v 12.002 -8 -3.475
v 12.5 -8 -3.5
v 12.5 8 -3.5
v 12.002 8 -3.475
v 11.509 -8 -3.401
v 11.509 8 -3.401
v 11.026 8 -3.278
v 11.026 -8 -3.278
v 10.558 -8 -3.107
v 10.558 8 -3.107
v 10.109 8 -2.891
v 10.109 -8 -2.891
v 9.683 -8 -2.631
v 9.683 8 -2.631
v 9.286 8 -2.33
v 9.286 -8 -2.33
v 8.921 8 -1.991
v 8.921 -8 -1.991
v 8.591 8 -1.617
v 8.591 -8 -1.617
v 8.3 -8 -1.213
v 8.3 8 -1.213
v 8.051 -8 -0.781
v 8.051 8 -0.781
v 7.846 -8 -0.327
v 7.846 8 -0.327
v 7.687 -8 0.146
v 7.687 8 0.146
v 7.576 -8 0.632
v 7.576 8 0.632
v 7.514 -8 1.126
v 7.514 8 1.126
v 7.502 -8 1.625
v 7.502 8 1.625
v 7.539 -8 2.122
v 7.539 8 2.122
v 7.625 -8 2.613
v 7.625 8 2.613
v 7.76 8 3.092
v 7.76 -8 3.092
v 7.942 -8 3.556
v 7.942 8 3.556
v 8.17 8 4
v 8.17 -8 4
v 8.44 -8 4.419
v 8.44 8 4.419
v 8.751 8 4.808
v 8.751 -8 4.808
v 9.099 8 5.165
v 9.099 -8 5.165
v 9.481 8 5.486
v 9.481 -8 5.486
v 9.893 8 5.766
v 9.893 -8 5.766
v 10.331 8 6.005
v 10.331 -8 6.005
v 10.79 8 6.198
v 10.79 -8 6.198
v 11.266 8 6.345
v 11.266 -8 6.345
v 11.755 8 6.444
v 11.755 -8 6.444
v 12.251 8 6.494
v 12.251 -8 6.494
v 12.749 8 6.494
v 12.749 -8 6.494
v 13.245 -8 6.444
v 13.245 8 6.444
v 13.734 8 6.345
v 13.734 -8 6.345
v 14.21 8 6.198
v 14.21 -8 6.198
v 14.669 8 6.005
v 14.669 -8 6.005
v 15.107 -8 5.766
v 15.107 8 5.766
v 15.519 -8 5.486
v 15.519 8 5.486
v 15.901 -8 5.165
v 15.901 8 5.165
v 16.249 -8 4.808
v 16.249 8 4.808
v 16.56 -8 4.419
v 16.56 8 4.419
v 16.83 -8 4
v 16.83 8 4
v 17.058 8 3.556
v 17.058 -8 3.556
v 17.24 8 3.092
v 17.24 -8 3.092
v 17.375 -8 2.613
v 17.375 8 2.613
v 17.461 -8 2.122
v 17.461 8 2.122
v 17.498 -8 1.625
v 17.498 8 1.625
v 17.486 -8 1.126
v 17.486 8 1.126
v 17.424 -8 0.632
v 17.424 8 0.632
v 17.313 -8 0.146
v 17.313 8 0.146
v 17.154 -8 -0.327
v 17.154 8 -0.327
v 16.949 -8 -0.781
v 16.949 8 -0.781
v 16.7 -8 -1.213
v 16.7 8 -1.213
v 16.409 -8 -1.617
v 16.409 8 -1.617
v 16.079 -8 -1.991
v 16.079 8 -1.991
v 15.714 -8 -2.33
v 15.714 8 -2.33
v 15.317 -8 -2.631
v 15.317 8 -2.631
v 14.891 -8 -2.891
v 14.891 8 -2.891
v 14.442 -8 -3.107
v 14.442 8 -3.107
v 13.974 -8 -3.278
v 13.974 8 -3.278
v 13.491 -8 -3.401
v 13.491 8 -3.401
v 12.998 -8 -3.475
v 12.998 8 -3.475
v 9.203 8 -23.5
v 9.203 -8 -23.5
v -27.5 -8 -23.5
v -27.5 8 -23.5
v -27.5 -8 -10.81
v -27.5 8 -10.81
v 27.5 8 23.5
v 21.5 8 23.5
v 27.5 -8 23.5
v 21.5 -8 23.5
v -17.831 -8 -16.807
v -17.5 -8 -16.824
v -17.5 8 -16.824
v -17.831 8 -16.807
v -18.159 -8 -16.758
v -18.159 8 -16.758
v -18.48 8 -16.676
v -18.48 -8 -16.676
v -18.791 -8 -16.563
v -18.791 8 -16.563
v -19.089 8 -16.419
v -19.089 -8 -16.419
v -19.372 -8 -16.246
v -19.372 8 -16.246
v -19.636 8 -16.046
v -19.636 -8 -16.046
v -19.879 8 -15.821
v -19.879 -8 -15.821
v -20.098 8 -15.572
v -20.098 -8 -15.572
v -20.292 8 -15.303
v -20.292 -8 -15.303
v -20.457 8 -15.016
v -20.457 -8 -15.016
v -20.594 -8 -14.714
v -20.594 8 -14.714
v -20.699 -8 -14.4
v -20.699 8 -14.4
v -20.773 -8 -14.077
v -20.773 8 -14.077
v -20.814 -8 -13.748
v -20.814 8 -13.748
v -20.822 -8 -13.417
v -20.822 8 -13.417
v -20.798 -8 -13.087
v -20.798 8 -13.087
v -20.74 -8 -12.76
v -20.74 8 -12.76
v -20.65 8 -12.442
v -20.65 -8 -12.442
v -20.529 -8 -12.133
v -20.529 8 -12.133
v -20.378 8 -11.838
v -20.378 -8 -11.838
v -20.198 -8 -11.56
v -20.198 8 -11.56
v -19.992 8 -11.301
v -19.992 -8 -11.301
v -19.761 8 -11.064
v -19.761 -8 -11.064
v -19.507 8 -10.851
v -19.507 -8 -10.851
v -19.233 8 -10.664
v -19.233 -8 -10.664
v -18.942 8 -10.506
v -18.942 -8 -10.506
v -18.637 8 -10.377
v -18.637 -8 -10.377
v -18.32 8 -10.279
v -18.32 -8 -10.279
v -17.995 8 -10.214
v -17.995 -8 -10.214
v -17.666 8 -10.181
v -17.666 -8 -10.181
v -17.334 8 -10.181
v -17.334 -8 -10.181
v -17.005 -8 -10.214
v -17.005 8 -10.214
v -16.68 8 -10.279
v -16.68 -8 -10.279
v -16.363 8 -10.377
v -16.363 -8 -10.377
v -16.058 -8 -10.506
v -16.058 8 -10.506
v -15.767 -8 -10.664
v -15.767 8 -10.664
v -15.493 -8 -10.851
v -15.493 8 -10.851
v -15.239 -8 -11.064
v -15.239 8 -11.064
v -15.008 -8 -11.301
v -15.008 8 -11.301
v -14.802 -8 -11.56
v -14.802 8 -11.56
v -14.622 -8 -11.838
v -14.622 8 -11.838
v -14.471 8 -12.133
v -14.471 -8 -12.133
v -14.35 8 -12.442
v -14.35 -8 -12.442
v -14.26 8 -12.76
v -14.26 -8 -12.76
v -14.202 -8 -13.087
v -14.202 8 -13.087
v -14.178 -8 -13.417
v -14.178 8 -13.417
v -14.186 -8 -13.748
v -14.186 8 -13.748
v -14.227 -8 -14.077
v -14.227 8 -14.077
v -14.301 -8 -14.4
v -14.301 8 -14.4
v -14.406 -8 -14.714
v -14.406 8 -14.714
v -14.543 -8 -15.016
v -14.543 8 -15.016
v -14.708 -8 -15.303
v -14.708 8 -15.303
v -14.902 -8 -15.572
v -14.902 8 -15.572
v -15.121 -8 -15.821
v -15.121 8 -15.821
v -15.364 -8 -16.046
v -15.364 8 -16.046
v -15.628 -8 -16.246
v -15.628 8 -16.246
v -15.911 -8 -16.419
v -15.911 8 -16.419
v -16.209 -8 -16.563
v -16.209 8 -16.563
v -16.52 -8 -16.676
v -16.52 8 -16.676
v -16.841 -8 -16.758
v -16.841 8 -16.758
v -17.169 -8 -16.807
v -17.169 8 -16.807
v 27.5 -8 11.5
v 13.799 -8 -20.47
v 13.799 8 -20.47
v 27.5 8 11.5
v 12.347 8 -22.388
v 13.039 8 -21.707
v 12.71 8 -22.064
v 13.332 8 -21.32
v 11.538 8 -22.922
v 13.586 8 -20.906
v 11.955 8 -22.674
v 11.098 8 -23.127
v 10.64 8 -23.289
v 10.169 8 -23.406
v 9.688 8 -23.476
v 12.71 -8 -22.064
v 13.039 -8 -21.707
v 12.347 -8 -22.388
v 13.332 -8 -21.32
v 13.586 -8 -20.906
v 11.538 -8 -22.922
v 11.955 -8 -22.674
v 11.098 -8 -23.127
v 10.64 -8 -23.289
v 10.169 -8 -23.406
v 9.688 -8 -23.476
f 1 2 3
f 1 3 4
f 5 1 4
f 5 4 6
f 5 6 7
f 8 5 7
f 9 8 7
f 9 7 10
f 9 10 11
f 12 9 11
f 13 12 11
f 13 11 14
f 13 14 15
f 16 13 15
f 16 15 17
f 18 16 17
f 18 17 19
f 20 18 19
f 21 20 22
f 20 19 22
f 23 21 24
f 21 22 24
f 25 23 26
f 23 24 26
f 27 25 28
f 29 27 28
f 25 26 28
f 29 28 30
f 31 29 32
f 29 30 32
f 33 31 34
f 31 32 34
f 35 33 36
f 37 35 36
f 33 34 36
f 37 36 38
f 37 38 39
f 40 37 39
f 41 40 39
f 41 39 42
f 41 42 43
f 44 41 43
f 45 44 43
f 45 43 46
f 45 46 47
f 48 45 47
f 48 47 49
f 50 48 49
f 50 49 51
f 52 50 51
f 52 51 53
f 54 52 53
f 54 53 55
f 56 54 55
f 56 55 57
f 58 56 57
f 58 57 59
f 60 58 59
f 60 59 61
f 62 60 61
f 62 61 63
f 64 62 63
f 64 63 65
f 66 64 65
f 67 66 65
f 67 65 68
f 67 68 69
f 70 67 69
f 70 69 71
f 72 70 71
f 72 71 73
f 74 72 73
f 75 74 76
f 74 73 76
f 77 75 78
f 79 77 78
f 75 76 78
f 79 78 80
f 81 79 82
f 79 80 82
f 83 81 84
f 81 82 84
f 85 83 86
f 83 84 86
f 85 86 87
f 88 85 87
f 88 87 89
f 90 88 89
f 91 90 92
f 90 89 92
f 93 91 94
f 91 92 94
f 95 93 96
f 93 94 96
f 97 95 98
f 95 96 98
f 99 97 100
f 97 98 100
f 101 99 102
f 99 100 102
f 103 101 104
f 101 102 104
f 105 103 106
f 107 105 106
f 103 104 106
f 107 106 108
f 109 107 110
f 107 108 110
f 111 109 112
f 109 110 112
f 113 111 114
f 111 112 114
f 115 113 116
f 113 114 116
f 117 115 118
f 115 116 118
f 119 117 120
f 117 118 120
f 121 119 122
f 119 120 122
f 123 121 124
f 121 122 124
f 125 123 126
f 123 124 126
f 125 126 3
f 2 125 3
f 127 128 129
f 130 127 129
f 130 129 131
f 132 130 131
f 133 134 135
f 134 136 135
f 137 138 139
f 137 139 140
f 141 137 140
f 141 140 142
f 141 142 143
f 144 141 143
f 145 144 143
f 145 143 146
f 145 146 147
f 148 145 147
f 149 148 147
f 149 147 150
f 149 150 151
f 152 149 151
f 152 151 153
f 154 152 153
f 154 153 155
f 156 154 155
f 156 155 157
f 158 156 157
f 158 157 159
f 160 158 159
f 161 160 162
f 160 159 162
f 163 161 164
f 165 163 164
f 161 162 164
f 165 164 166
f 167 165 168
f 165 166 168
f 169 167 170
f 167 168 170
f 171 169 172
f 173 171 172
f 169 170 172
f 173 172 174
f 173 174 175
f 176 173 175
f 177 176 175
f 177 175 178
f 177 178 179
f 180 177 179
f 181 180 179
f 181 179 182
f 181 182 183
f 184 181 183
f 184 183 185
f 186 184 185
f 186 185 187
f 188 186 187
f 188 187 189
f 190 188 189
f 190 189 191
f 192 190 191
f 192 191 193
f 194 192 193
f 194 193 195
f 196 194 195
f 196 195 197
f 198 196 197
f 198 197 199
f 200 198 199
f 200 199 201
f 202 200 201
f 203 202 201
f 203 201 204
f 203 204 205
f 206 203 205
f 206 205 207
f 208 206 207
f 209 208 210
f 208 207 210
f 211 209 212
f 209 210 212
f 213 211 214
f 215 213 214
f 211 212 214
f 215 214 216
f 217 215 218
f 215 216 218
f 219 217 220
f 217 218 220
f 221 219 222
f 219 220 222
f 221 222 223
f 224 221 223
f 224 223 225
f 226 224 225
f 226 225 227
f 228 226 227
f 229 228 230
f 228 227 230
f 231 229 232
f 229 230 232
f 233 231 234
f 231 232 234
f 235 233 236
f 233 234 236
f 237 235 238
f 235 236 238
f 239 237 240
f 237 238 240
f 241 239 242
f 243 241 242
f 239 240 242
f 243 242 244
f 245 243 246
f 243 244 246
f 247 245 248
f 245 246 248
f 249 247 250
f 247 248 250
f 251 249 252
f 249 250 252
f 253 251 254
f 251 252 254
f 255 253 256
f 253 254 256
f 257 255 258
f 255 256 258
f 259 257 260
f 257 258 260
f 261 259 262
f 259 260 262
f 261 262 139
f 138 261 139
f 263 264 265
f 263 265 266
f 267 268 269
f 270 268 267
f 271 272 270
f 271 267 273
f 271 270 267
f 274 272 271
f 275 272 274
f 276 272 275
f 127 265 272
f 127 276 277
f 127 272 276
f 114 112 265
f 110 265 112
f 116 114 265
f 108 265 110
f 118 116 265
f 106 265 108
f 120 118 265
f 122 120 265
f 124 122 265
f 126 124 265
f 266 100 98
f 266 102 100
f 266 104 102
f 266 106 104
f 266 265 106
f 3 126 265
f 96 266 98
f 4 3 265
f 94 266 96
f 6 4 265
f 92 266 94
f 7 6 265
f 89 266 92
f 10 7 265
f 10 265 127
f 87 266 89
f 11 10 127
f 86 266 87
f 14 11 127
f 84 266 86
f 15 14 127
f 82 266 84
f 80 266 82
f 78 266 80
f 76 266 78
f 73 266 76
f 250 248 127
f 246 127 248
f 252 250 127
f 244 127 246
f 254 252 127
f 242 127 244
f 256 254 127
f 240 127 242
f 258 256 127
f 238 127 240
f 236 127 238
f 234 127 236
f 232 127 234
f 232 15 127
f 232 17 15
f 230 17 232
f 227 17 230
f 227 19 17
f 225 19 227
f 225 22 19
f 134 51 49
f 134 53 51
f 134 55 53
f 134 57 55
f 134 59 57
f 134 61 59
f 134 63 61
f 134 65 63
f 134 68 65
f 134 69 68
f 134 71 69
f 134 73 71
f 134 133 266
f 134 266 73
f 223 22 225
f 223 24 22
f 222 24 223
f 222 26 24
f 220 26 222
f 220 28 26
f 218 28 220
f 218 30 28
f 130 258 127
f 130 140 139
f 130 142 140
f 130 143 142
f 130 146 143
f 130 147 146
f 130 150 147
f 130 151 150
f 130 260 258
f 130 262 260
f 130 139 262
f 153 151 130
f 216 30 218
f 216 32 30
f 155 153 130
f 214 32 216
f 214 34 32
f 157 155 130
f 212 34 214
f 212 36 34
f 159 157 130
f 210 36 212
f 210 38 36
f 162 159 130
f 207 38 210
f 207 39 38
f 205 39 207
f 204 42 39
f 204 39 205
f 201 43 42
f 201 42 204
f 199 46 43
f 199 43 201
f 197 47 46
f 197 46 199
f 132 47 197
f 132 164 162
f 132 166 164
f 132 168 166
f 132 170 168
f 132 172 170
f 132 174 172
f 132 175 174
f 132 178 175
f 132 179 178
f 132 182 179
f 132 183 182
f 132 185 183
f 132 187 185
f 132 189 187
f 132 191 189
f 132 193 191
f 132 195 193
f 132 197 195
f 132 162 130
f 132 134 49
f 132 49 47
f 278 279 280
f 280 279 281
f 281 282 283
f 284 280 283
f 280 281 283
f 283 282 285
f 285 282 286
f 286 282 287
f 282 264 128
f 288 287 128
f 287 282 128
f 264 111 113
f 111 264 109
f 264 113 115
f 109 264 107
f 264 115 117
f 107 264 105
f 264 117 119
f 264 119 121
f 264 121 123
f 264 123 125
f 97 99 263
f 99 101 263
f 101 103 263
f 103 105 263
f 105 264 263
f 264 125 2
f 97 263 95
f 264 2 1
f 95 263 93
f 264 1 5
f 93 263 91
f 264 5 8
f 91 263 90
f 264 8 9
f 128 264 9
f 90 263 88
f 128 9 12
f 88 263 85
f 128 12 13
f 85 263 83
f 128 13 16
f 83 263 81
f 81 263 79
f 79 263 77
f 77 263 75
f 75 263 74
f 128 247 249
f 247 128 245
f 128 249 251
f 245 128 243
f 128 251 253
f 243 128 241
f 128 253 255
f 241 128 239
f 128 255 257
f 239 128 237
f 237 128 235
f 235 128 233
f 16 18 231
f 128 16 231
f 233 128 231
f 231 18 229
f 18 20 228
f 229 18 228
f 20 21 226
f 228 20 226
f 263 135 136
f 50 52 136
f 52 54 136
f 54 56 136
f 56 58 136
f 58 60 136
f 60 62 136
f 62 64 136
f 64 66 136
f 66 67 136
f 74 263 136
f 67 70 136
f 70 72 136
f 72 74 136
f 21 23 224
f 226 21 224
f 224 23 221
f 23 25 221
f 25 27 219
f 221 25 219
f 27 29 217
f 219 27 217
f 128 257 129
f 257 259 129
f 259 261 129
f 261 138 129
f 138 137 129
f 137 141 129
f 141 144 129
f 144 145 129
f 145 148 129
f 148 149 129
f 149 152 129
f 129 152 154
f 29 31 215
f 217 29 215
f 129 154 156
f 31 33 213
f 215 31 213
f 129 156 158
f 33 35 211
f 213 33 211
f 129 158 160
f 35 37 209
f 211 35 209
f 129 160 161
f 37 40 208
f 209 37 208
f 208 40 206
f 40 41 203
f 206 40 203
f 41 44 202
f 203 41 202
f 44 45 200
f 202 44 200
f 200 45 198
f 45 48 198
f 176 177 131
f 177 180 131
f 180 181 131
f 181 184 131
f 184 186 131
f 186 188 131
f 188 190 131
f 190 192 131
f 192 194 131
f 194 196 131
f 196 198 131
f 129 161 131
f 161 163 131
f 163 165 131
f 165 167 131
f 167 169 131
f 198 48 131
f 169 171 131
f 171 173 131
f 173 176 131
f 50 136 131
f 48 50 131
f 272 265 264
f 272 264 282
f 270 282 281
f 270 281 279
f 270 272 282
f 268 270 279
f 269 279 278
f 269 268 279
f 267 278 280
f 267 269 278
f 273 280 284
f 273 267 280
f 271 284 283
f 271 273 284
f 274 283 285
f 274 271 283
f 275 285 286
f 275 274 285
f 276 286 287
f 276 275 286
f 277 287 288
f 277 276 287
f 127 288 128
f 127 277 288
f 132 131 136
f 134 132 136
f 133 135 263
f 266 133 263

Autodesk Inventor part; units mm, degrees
ref_plane "YZ Plane" through (0, 0, 0) normal (1, 0, 0) x (0, 1, 0)
ref_plane "XZ Plane" through (0, 0, 0) normal (0, 1, 0) x (-1, 0, 0)
ref_plane "XY Plane" through (0, 0, 0) normal (0, 0, 1) x (1, 0, 0)
sketch "Sketch2" plane through (0, 0, 0) normal (0, 1, 0) x (-1, 0, 0)
  line L0 (-27.5, -23.5) -> (27.5, -23.5)
  line L1 (27.5, -23.5) -> (27.5, 23.5)
  line L2 (27.5, 23.5) -> (-27.5, 23.5)
  line L3 (-27.5, 23.5) -> (-27.5, -23.5)
  line L4 (-27.5, -23.5) -> (27.5, 23.5) construction
  line L5 (27.5, -23.5) -> (-27.5, 23.5) construction
  line L6 (27.5, -10.8102) -> (-21.5, 23.5)
  line L7 (-12.5, -23.5) -> (-27.5, 11.5)
  point P0 (0, 0)
  dimension "d1" = 55
  dimension "d2" = 47
  dimension "d3" = 15
  dimension "d4" = 6
  dimension "d5" = 35
  dimension "d28" = 35
  dimension "d29" = 12.6898
extrude "Extrusion1" add sketch "Sketch2" along normal mid plane 16 contours L7 L3 L2 L6 L1 L0
sketch "Sketch3" plane through (0, -8, 0) normal (0, -1, 0) x (1, 0, 0)
  line L0 (-27.5, -23.5) -> (12.5, -23.5) projected
  line L1 (27.5, 11.5) -> (27.5, 23.5) projected
  point P0 (0, 0)
  point P1 (12.5, 1.5)
  dimension "d9" = 25
  dimension "d10" = 15
hole "Hole1" at (12.5, -8, 1.5) direction (0, 1, 0) diameter 10 end through all
sketch "Sketch4" plane through (0, -8, 0) normal (0, -1, 0) x (1, 0, 0)
  line L0 (-27.5, -23.5) -> (12.5, -23.5) projected
  line L1 (27.5, 11.5) -> (27.5, 23.5) projected
  point P0 (0, 0)
  point P1 (-17.5, -13.5)
  dimension "d18" = 10
  dimension "d19" = 45
hole "Hole2" at (-17.5, -8, -13.5) direction (0, 1, 0) diameter 6.647 end through all thread size "M8x1.25" class "6H" standard "TS profile"
fillet "Fillet1" radius 5 1 edges at (12.5, 0, -23.5)
properties part number "TL20240701-10100AT-003" material "MC NYLON"
